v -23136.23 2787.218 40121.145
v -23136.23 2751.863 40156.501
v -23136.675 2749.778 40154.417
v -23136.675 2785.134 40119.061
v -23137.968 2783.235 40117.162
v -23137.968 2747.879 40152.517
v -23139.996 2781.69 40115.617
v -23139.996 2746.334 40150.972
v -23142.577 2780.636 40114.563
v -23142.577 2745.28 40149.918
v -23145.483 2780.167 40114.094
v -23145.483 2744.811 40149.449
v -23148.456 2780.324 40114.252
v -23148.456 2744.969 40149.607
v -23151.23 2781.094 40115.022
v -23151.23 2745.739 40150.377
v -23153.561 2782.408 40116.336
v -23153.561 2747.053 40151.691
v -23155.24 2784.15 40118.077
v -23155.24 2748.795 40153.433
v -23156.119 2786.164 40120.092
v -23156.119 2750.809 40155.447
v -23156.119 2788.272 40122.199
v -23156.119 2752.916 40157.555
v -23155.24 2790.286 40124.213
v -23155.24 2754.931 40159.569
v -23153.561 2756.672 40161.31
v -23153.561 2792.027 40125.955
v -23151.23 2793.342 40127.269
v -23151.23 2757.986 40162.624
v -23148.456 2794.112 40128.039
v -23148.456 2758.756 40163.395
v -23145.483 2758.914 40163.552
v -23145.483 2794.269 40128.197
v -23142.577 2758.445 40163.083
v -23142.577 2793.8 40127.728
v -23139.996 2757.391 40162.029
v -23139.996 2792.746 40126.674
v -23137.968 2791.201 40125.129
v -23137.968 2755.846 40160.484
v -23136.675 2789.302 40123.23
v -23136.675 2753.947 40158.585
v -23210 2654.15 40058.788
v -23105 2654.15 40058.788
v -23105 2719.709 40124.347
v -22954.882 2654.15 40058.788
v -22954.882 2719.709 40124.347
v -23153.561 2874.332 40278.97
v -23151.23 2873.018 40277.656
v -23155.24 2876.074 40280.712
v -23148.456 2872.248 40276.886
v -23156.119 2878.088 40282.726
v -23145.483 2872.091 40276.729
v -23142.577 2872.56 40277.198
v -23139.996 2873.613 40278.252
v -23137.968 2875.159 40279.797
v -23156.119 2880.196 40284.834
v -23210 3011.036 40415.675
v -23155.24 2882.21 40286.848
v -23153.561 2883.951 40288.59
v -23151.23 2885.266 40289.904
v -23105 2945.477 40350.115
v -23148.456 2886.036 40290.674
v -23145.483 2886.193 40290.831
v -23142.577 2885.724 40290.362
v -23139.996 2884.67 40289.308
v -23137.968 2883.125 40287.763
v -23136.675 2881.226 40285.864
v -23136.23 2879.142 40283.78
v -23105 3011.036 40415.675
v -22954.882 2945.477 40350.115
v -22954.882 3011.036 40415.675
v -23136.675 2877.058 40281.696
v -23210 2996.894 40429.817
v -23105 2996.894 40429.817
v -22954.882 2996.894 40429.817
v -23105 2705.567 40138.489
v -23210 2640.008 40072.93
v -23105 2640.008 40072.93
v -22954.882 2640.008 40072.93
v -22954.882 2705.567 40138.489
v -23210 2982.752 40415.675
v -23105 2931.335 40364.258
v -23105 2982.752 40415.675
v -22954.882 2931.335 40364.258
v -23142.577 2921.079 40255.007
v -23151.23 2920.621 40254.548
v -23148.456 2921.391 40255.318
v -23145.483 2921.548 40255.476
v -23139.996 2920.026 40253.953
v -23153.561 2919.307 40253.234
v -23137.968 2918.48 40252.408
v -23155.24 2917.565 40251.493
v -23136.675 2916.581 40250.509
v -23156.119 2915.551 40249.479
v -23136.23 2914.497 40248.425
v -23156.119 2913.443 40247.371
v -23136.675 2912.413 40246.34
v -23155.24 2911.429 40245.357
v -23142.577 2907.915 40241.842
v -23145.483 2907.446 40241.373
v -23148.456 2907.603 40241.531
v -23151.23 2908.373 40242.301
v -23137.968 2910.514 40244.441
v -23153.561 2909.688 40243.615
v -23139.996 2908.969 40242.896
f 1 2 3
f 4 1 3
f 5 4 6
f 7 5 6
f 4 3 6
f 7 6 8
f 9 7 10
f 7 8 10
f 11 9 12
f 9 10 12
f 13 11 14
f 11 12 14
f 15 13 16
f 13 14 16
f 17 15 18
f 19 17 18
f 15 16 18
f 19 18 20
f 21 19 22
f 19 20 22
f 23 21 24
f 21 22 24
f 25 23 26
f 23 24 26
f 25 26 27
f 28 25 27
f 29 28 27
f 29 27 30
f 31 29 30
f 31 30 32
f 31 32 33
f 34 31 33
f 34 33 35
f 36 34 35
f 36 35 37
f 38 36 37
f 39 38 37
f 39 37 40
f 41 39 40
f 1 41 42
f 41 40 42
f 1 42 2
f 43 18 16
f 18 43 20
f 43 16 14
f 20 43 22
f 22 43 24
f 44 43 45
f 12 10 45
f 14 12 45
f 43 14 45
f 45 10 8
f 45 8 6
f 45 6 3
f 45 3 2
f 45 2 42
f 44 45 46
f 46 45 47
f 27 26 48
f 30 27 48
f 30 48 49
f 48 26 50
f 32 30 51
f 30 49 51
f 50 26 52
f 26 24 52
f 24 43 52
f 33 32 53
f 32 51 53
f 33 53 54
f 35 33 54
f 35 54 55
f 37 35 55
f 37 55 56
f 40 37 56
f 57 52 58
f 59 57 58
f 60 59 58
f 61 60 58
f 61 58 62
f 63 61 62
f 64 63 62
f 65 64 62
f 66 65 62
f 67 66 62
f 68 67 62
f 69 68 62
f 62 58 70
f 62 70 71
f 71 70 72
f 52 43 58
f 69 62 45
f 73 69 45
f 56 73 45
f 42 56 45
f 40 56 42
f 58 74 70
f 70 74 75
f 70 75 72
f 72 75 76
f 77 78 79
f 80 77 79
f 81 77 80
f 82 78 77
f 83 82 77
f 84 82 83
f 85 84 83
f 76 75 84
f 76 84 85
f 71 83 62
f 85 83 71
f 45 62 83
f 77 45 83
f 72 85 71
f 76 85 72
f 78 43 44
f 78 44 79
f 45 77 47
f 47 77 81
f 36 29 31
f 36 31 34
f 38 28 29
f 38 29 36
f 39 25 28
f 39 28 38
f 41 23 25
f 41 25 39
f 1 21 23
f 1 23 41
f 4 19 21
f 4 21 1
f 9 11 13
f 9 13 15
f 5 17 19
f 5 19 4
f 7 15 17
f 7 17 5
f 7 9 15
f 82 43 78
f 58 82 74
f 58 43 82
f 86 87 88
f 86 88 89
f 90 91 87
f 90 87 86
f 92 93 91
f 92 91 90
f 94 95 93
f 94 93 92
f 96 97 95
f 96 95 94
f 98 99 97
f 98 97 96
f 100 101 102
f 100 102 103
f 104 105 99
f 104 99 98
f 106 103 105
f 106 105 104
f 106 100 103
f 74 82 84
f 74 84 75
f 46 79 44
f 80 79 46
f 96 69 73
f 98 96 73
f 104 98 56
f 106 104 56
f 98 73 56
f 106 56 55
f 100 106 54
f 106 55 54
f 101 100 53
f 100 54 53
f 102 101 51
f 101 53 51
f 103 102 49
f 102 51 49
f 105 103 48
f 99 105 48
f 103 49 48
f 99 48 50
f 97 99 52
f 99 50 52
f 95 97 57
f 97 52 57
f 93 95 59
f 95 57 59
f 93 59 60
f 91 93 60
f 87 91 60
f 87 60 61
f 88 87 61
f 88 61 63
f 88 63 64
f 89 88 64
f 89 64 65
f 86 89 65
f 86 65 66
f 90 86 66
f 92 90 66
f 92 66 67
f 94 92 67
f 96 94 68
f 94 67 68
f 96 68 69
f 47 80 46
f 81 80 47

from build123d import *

# Parameters (mm, degrees)
BOSS_EXTRUDE1_START      = -23110
BOSS_EXTRUDE1_DEPTH      = 5
BOSS_EXTRUDE1_DEPTH_BACK = 100
SKETCH3_W                = 150.118051911
SKETCH3_H                = 92.714651823
BOSS_EXTRUDE2_DEPTH      = 20
SKETCH4_R                = 10
BOSS_EXTRUDE3_DEPTH      = 50


with BuildPart() as part:
    # Sketch2 → Boss-Extrude1 (new body, two sides)
    with BuildSketch(Plane(origin=(0, 0, 0), x_dir=(0, 0, -1), z_dir=(1, 0, 0)).offset(BOSS_EXTRUDE1_START)) as boss_extrude1_sk:
        Polygon((-40429.816686048, 2996.894248022), (-40415.674550424, 3011.036383646), (-40415.674550424, 2982.752112399), align=None)
        Polygon((-40072.930236915, 2640.00779889), (-40415.674550424, 2982.752112399), (-40415.674550424, 3011.036383646), (-40072.930236915, 2668.292070137), align=None)
        Polygon((-40058.788101291, 2654.149934513), (-40072.930236915, 2640.00779889), (-40072.930236915, 2668.292070137), align=None)
    extrude(amount=BOSS_EXTRUDE1_DEPTH)
    extrude(boss_extrude1_sk.sketch, amount=-BOSS_EXTRUDE1_DEPTH_BACK)

    # Sketch3 → Boss-Extrude2 (add)
    with BuildSketch(Plane(origin=(0, -18716.461219013, 18716.461219015), x_dir=(1, 0, 0), z_dir=(0, -0.707106781, 0.707106781))):
        with Locations((-23029.940974045, 30660.964460197)):
            Rectangle(SKETCH3_W, SKETCH3_H)
        with Locations((-23029.940974045, 30248.965455429)):
            Rectangle(SKETCH3_W, SKETCH3_H)
    extrude(amount=-BOSS_EXTRUDE2_DEPTH)

    # Sketch4 → Boss-Extrude3 (add)
    with BuildSketch(Plane(origin=(0, -18702.319083389, 18702.319083389), x_dir=(1, 0, 0), z_dir=(0, 0.707106781, -0.707106781))):
        with Locations((-23146.230449039, -30340.794679614)):
            Circle(SKETCH4_R)
        with Locations((-23146.230449039, -30520.794679614)):
            Circle(SKETCH4_R)
    extrude(amount=BOSS_EXTRUDE3_DEPTH)


solid = part.part
